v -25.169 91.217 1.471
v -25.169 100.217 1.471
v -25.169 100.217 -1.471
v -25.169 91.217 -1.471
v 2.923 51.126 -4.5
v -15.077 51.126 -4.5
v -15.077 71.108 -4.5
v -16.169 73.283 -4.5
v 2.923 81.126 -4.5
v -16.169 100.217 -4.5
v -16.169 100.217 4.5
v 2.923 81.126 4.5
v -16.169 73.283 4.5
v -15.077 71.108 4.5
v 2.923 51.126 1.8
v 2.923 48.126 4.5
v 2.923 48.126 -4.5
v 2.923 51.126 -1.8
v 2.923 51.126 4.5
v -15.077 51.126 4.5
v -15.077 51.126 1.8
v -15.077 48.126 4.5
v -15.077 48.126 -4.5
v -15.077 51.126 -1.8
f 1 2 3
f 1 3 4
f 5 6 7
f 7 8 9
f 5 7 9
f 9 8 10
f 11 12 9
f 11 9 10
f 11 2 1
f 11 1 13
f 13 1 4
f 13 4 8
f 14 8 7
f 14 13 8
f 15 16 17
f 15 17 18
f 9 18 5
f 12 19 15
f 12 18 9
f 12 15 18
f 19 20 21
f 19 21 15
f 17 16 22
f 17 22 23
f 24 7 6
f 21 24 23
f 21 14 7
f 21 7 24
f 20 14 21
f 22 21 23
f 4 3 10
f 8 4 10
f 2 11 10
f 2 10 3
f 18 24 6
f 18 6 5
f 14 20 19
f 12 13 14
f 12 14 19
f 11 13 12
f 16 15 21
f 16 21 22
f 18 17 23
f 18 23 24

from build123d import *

# Parameters (mm, degrees)
BOSS_EXTRUDE1_DEPTH = 15
BOSS_EXTRUDE2_DEPTH = 60
CUT_EXTRUDE1_DEPTH  = 174.639610307
SCALE1_SCALE        = 0.3


with BuildPart() as part:
    # Sketch1 → Boss-Extrude1 (new body, symmetric)
    with BuildSketch(Plane.XY):
        Polygon((30, 0), (30, 100), (-33.639610307, 163.639610307), (-63.639610307, 163.639610307), (-63.639610307, 133.639610307), (-30, 66.606956932), (-30, 0), align=None)
    extrude(amount=BOSS_EXTRUDE1_DEPTH, both=True)

    # Sketch2 → Boss-Extrude2 (add)
    with BuildSketch(Plane(origin=(30, 0, 0), x_dir=(0, 0, -1), z_dir=(1, 0, 0))):
        Polygon((-15, -10), (15, -10), (6, 0), (-6, 0), align=None)
    extrude(amount=-BOSS_EXTRUDE2_DEPTH)

    # Sketch3 → Cut-Extrude1 (cut, through all)
    with BuildSketch(Plane(origin=(0, 163.639610307, 0), x_dir=(1, 0, 0), z_dir=(0, 1, 0))):
        Polygon((-63.639610307, 4.904583897), (-33.639610307, 15), (-33.639610307, 32.919088084), (-75.208668343, 32.919088084), (-75.208668343, 4.904583897), align=None)
        Polygon((-75.208668343, -32.919088084), (-75.208668343, -4.904583897), (-63.639610307, -4.904583897), (-33.639610307, -15), (-33.639610307, -32.919088084), align=None)
    extrude(amount=-CUT_EXTRUDE1_DEPTH, mode=Mode.SUBTRACT)


with BuildPart() as part_1:
    # Scale1: scaled about (-8.681688246, 73.036435377, 0)
    add(part.part.scale(SCALE1_SCALE).moved(Location((-6.077181772, 51.125504764, 0))))


solid = part_1.part
